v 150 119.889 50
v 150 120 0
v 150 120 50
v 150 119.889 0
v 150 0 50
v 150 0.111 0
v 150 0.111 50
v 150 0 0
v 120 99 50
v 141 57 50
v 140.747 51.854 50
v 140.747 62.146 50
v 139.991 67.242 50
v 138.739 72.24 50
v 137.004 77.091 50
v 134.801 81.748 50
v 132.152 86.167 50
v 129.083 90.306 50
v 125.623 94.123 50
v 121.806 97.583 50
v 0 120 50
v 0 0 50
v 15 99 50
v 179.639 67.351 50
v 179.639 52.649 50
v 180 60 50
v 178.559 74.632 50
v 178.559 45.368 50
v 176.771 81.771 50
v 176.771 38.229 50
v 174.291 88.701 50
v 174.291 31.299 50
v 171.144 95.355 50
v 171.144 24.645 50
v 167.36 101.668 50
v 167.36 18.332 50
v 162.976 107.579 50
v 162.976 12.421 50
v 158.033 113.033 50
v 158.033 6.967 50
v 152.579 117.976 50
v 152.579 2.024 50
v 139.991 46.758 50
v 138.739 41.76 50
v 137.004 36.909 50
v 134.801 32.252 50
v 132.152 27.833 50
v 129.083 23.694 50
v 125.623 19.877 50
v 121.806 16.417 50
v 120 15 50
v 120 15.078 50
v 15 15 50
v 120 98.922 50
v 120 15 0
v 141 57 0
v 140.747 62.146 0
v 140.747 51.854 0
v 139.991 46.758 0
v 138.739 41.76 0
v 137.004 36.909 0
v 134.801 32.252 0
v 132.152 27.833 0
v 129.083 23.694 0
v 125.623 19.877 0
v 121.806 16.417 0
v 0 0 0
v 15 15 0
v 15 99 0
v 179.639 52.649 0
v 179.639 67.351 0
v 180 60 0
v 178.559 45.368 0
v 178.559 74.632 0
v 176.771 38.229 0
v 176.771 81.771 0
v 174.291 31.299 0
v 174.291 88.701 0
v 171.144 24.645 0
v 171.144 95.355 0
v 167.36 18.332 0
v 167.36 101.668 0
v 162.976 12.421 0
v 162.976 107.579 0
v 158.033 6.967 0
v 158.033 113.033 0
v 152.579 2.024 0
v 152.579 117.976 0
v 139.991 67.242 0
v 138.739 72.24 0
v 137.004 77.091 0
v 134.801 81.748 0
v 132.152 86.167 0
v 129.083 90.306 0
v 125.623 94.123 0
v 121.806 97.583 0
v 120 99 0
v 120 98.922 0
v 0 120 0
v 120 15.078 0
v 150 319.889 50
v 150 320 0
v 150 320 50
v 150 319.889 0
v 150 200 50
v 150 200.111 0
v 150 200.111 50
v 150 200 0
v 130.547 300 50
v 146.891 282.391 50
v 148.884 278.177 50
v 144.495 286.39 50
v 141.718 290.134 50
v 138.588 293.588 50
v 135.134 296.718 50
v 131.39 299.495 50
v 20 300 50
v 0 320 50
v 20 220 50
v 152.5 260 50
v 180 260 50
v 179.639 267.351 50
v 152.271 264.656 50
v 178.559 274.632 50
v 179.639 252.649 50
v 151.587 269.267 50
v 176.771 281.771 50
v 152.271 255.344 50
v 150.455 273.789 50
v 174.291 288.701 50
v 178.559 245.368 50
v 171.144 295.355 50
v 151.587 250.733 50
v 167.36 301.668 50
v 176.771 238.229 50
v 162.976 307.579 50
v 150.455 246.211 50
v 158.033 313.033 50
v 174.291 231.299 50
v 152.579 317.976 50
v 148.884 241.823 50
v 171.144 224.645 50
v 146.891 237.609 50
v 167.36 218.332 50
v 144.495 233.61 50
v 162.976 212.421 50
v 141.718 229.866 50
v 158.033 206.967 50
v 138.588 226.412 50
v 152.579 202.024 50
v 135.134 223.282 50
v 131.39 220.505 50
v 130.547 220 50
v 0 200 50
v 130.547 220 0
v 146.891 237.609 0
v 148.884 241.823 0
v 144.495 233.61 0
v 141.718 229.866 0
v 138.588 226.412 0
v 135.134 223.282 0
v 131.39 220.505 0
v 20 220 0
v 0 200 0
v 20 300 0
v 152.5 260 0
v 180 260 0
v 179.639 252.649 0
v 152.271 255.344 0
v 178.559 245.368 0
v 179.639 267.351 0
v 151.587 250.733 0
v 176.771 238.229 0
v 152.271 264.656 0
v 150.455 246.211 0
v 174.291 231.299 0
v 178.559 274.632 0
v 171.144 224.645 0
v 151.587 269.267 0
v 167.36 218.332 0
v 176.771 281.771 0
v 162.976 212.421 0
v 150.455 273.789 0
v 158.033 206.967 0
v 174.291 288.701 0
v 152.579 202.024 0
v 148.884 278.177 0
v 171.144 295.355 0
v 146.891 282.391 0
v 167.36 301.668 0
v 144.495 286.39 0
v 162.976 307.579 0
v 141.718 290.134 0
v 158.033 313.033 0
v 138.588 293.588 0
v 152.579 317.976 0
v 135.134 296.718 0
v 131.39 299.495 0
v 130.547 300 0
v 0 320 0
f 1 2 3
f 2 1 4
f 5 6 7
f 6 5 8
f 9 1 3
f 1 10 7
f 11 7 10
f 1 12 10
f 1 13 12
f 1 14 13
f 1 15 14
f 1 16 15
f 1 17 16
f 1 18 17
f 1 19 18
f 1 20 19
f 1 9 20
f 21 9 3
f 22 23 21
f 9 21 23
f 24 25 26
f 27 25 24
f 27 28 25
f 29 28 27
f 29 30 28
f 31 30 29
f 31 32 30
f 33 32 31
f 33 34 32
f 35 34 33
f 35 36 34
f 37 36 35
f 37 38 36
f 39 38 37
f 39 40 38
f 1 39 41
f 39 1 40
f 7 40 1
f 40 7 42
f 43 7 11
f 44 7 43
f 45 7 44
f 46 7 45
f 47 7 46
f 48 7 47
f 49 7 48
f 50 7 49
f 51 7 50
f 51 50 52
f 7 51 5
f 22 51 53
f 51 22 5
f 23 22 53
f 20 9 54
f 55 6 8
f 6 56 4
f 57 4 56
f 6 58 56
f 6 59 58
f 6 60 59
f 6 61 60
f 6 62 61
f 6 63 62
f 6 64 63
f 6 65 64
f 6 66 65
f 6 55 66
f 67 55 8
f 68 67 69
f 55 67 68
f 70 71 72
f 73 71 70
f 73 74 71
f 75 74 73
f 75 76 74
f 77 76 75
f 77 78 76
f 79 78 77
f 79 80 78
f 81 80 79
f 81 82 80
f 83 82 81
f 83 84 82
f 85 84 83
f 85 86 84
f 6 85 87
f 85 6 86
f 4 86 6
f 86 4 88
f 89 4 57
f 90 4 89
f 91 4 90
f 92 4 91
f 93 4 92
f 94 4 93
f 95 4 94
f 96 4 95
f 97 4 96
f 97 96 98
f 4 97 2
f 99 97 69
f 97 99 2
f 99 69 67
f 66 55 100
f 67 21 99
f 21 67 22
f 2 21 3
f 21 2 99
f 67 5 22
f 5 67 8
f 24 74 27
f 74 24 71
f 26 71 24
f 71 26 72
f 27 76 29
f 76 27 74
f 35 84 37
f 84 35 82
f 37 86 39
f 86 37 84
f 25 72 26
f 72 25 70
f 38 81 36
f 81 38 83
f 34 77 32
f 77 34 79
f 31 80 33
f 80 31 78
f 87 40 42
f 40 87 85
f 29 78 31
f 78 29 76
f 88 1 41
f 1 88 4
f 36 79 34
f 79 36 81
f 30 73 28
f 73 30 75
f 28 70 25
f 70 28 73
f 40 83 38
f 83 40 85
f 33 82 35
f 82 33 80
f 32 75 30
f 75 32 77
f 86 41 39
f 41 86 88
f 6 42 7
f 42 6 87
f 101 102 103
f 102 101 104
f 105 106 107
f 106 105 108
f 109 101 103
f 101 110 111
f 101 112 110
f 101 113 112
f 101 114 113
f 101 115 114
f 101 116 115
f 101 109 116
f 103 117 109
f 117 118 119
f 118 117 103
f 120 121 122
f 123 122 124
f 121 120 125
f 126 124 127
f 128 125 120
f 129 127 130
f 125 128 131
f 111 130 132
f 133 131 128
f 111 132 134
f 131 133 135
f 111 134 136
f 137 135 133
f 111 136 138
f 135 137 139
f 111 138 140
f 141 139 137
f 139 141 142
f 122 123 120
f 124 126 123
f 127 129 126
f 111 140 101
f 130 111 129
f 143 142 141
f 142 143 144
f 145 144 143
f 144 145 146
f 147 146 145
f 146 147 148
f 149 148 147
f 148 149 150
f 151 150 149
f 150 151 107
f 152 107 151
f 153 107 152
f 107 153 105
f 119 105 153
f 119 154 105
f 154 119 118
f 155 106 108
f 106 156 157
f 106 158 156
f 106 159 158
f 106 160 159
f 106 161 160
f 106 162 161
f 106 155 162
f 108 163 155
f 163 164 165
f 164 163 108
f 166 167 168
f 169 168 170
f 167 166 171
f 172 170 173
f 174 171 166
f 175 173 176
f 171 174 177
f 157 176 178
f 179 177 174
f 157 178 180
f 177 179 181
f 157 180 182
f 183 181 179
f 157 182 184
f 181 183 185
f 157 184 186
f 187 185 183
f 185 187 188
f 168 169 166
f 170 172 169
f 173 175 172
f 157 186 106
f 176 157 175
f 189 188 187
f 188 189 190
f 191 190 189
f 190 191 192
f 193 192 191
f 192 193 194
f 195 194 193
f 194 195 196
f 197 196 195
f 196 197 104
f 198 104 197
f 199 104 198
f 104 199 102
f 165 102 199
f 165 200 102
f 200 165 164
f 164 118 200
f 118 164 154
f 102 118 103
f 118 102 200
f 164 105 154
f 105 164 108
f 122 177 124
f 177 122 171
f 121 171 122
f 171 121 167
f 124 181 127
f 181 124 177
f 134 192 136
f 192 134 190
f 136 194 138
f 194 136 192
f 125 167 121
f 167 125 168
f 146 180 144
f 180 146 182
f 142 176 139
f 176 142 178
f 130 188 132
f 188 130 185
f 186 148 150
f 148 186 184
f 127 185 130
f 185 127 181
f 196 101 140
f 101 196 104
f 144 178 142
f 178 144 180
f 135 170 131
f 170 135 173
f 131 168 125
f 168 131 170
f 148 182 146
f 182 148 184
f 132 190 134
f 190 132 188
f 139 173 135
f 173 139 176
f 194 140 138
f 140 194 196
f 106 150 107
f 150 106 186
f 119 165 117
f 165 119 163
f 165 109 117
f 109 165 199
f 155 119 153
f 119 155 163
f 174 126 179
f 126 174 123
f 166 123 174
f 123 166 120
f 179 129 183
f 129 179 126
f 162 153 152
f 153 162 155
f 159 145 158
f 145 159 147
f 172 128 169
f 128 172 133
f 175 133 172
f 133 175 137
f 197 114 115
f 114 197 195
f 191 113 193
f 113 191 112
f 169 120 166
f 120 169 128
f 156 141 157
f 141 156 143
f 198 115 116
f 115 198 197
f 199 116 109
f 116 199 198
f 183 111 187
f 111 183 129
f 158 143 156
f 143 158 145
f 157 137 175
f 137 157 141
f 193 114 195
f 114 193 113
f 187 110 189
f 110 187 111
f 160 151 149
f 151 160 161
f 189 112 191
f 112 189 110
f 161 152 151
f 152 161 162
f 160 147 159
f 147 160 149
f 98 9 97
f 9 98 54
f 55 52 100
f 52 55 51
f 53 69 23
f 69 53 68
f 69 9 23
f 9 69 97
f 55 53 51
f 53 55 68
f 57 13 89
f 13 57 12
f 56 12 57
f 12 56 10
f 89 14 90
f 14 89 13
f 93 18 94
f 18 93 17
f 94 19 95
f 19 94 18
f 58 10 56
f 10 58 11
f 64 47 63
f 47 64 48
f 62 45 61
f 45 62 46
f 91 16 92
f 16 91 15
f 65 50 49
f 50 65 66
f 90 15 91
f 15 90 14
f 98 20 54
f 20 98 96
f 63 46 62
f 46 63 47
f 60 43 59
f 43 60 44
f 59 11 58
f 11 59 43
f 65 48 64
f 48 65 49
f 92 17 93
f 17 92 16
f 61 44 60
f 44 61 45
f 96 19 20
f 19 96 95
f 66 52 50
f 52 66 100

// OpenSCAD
// test_obj
// 13.05.2026 Sebastian Weigl

// include <rounded_rect.scad>
// rr(x_length,y_length,radius,height);
$fn=64;

// declare body's
// outer body
module outer_body(){
difference(){
  union(){
  translate([0,0,0]) cube([150,120,50]);
  translate([105,60,25]) cylinder(h=50,d=150,center=true);
  }
  translate([0,-15,0]) cube([150,15,50]);
  translate([0,120,0]) cube([150,15,50]);
}}

// inner body
module inner_body(){  
difference(){
  union(){
  translate([20,20,]) cube([110,80,50]);
  translate([105,60,25]) cylinder(h=50,d=95,center=true);
  }
  translate([20,5,0]) cube([112,15,50]);
  translate([20,100,0]) cube([112,15,50]);
}}

// use the declared body's
translate([0,200,0])
difference(){
outer_body();
inner_body();
}

// use scale
difference(){
outer_body();
#translate([15,15,0]) scale([.7,.7,1]) outer_body();}
